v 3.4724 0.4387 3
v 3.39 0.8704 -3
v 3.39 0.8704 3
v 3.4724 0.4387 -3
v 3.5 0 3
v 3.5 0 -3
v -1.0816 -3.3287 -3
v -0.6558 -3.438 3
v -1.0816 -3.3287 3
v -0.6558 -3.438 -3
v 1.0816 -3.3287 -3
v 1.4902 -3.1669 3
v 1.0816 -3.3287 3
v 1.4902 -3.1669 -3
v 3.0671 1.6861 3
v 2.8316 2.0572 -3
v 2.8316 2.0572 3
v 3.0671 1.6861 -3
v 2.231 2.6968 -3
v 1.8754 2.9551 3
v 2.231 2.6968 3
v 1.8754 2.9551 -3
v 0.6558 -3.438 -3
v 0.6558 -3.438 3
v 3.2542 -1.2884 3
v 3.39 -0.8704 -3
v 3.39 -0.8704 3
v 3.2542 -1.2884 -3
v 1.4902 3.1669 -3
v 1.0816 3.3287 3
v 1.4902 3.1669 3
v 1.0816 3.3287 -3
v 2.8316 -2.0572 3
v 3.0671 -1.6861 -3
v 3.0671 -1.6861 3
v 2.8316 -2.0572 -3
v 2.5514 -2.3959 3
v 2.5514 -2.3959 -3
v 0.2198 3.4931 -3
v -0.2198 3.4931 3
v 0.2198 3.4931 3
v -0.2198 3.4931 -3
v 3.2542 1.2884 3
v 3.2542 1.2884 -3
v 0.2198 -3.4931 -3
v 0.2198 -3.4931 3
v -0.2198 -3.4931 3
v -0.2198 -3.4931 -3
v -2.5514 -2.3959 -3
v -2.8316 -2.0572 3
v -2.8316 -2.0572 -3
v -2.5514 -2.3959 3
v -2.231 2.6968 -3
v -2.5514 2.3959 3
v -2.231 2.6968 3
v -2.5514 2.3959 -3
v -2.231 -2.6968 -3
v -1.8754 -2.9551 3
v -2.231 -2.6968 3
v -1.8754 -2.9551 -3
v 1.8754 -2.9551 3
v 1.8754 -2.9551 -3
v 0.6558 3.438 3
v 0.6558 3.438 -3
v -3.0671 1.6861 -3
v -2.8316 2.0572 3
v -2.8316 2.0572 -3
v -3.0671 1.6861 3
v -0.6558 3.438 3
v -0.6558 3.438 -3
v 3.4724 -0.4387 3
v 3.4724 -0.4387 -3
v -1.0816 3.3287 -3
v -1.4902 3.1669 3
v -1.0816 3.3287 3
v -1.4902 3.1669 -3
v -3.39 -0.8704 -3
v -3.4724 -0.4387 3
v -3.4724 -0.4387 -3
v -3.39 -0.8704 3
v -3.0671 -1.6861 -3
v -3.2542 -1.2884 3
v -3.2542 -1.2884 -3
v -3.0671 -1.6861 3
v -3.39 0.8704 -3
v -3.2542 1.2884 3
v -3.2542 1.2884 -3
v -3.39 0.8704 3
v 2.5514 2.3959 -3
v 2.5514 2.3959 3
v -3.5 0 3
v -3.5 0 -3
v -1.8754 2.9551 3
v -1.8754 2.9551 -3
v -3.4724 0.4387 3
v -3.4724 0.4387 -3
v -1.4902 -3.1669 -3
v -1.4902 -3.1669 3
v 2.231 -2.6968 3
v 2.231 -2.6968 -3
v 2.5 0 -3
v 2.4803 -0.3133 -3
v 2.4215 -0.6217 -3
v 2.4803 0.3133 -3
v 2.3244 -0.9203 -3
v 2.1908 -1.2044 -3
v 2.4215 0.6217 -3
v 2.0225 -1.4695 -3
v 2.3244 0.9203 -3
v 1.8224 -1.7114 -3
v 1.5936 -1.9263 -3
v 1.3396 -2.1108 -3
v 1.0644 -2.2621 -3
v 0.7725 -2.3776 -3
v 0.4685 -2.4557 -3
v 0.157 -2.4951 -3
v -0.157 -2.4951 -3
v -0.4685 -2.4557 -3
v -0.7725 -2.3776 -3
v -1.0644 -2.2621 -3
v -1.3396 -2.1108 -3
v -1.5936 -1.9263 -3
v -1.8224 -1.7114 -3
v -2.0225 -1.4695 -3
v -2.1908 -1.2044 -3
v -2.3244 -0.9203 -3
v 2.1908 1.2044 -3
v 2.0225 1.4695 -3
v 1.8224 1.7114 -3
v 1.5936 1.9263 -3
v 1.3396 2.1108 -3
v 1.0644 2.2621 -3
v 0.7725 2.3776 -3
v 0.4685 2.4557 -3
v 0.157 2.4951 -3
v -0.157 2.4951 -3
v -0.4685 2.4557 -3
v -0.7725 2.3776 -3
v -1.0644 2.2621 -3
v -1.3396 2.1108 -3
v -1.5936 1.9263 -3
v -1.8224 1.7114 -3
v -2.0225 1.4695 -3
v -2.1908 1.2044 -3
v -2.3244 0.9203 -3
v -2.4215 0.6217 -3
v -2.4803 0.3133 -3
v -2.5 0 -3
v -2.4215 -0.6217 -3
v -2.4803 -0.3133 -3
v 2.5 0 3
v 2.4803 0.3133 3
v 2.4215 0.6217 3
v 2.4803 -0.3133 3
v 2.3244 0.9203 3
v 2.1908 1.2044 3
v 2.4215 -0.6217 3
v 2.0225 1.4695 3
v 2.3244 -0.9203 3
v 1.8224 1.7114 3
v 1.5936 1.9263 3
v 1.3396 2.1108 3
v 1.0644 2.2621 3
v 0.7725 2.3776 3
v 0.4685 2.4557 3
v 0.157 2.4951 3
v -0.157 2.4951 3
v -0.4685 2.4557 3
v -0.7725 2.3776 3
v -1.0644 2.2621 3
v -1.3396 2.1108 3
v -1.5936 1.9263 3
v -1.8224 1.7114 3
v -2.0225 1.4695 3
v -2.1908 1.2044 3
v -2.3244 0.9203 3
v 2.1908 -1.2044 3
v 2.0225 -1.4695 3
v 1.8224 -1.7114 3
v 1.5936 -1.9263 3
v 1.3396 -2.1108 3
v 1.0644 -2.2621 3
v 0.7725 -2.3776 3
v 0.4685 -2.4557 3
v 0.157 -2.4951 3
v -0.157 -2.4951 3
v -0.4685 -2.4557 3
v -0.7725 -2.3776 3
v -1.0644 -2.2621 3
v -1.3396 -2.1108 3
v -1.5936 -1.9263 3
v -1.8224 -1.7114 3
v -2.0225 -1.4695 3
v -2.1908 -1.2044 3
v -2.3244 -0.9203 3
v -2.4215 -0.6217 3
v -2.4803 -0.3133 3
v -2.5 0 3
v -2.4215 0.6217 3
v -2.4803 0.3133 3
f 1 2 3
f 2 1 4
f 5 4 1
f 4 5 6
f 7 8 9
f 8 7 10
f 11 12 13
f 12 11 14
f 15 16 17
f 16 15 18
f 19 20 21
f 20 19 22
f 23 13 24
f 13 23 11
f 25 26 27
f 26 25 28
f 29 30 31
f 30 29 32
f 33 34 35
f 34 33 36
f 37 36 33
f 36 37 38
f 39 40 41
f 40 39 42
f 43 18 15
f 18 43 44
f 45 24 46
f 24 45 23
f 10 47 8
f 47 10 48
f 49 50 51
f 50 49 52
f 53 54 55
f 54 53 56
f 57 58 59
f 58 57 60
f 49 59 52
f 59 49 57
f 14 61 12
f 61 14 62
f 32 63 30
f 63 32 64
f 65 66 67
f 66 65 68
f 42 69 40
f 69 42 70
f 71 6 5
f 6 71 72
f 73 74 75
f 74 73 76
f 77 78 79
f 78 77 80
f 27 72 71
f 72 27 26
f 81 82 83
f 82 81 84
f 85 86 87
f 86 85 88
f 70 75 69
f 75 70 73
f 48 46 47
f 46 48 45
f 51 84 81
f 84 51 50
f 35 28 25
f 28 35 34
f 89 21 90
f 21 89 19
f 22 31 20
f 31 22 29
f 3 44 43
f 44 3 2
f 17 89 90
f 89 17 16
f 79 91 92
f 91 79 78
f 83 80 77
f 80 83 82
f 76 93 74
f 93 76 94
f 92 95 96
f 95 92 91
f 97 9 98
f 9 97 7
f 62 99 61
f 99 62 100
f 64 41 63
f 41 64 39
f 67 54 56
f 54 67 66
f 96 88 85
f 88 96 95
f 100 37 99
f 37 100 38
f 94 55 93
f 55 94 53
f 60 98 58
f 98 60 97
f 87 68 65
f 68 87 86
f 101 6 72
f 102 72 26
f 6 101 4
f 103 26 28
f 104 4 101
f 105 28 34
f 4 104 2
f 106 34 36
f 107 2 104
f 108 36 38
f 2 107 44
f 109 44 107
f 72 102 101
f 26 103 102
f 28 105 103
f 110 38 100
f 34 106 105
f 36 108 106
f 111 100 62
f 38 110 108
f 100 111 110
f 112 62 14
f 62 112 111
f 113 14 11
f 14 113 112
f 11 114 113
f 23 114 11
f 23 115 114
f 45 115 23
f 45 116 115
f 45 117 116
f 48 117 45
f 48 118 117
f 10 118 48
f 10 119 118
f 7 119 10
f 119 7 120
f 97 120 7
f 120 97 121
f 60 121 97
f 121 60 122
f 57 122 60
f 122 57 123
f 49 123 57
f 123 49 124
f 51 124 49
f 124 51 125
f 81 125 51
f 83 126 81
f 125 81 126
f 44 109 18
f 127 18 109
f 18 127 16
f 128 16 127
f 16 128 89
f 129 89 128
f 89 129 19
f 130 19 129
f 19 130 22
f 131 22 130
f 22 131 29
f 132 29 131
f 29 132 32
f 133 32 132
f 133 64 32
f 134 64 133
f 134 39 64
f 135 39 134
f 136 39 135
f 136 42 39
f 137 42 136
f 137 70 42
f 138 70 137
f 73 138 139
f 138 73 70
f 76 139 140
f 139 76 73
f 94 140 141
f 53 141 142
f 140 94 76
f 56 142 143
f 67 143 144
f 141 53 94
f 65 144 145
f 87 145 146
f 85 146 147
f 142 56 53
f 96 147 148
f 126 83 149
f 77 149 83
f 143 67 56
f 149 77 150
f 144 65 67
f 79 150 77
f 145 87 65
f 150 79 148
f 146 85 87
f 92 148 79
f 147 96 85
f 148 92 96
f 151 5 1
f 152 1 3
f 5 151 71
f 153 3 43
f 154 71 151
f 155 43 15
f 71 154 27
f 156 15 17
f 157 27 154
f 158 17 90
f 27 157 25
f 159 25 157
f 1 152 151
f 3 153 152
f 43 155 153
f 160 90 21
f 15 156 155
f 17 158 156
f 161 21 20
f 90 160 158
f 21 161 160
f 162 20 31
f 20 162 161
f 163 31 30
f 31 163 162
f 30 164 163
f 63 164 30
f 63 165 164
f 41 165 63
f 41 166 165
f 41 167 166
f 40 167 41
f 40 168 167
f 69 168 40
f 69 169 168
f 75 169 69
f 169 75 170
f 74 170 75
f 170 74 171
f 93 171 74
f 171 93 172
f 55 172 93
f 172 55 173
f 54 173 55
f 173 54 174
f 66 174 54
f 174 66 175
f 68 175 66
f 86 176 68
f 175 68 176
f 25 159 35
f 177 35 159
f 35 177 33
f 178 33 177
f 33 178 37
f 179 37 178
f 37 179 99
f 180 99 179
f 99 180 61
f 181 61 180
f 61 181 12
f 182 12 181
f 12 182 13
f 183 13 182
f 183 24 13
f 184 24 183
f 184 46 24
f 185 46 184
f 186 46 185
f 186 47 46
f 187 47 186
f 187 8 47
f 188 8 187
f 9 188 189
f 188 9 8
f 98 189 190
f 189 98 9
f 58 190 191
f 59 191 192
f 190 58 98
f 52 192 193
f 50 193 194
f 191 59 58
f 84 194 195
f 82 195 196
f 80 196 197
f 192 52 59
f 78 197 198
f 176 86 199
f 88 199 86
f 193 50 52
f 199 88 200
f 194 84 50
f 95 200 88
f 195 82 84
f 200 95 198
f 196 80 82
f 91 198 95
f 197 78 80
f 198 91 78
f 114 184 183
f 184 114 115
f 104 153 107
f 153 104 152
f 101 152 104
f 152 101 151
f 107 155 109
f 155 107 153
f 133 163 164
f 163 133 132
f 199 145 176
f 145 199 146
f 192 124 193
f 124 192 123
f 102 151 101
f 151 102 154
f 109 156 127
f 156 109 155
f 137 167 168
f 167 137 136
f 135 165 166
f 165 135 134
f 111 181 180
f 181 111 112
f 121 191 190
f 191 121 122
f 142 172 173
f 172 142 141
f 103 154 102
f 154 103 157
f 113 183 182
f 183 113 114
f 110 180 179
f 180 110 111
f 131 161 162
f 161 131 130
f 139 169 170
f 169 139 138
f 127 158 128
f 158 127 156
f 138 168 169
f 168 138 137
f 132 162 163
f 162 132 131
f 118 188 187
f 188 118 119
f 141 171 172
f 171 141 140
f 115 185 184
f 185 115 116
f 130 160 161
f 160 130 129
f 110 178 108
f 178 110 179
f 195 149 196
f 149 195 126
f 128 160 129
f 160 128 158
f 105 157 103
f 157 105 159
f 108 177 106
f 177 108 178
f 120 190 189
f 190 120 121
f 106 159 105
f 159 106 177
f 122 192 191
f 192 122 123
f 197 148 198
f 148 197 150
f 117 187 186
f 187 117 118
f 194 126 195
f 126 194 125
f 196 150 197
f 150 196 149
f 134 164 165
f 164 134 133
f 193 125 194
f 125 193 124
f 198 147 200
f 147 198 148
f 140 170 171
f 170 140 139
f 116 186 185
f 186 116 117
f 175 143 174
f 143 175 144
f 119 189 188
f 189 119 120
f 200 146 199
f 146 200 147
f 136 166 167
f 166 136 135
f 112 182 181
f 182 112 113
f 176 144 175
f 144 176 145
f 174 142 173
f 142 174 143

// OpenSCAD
$fn = 50;


difference() {
	union() {
		translate(v = [0, 0, -3.0000000000]) {
			cylinder(h = 6, r = 3.5000000000);
		}
	}
	union() {
		translate(v = [0, 0, -100.0000000000]) {
			cylinder(h = 200, r = 2.5000000000);
		}
	}
}
